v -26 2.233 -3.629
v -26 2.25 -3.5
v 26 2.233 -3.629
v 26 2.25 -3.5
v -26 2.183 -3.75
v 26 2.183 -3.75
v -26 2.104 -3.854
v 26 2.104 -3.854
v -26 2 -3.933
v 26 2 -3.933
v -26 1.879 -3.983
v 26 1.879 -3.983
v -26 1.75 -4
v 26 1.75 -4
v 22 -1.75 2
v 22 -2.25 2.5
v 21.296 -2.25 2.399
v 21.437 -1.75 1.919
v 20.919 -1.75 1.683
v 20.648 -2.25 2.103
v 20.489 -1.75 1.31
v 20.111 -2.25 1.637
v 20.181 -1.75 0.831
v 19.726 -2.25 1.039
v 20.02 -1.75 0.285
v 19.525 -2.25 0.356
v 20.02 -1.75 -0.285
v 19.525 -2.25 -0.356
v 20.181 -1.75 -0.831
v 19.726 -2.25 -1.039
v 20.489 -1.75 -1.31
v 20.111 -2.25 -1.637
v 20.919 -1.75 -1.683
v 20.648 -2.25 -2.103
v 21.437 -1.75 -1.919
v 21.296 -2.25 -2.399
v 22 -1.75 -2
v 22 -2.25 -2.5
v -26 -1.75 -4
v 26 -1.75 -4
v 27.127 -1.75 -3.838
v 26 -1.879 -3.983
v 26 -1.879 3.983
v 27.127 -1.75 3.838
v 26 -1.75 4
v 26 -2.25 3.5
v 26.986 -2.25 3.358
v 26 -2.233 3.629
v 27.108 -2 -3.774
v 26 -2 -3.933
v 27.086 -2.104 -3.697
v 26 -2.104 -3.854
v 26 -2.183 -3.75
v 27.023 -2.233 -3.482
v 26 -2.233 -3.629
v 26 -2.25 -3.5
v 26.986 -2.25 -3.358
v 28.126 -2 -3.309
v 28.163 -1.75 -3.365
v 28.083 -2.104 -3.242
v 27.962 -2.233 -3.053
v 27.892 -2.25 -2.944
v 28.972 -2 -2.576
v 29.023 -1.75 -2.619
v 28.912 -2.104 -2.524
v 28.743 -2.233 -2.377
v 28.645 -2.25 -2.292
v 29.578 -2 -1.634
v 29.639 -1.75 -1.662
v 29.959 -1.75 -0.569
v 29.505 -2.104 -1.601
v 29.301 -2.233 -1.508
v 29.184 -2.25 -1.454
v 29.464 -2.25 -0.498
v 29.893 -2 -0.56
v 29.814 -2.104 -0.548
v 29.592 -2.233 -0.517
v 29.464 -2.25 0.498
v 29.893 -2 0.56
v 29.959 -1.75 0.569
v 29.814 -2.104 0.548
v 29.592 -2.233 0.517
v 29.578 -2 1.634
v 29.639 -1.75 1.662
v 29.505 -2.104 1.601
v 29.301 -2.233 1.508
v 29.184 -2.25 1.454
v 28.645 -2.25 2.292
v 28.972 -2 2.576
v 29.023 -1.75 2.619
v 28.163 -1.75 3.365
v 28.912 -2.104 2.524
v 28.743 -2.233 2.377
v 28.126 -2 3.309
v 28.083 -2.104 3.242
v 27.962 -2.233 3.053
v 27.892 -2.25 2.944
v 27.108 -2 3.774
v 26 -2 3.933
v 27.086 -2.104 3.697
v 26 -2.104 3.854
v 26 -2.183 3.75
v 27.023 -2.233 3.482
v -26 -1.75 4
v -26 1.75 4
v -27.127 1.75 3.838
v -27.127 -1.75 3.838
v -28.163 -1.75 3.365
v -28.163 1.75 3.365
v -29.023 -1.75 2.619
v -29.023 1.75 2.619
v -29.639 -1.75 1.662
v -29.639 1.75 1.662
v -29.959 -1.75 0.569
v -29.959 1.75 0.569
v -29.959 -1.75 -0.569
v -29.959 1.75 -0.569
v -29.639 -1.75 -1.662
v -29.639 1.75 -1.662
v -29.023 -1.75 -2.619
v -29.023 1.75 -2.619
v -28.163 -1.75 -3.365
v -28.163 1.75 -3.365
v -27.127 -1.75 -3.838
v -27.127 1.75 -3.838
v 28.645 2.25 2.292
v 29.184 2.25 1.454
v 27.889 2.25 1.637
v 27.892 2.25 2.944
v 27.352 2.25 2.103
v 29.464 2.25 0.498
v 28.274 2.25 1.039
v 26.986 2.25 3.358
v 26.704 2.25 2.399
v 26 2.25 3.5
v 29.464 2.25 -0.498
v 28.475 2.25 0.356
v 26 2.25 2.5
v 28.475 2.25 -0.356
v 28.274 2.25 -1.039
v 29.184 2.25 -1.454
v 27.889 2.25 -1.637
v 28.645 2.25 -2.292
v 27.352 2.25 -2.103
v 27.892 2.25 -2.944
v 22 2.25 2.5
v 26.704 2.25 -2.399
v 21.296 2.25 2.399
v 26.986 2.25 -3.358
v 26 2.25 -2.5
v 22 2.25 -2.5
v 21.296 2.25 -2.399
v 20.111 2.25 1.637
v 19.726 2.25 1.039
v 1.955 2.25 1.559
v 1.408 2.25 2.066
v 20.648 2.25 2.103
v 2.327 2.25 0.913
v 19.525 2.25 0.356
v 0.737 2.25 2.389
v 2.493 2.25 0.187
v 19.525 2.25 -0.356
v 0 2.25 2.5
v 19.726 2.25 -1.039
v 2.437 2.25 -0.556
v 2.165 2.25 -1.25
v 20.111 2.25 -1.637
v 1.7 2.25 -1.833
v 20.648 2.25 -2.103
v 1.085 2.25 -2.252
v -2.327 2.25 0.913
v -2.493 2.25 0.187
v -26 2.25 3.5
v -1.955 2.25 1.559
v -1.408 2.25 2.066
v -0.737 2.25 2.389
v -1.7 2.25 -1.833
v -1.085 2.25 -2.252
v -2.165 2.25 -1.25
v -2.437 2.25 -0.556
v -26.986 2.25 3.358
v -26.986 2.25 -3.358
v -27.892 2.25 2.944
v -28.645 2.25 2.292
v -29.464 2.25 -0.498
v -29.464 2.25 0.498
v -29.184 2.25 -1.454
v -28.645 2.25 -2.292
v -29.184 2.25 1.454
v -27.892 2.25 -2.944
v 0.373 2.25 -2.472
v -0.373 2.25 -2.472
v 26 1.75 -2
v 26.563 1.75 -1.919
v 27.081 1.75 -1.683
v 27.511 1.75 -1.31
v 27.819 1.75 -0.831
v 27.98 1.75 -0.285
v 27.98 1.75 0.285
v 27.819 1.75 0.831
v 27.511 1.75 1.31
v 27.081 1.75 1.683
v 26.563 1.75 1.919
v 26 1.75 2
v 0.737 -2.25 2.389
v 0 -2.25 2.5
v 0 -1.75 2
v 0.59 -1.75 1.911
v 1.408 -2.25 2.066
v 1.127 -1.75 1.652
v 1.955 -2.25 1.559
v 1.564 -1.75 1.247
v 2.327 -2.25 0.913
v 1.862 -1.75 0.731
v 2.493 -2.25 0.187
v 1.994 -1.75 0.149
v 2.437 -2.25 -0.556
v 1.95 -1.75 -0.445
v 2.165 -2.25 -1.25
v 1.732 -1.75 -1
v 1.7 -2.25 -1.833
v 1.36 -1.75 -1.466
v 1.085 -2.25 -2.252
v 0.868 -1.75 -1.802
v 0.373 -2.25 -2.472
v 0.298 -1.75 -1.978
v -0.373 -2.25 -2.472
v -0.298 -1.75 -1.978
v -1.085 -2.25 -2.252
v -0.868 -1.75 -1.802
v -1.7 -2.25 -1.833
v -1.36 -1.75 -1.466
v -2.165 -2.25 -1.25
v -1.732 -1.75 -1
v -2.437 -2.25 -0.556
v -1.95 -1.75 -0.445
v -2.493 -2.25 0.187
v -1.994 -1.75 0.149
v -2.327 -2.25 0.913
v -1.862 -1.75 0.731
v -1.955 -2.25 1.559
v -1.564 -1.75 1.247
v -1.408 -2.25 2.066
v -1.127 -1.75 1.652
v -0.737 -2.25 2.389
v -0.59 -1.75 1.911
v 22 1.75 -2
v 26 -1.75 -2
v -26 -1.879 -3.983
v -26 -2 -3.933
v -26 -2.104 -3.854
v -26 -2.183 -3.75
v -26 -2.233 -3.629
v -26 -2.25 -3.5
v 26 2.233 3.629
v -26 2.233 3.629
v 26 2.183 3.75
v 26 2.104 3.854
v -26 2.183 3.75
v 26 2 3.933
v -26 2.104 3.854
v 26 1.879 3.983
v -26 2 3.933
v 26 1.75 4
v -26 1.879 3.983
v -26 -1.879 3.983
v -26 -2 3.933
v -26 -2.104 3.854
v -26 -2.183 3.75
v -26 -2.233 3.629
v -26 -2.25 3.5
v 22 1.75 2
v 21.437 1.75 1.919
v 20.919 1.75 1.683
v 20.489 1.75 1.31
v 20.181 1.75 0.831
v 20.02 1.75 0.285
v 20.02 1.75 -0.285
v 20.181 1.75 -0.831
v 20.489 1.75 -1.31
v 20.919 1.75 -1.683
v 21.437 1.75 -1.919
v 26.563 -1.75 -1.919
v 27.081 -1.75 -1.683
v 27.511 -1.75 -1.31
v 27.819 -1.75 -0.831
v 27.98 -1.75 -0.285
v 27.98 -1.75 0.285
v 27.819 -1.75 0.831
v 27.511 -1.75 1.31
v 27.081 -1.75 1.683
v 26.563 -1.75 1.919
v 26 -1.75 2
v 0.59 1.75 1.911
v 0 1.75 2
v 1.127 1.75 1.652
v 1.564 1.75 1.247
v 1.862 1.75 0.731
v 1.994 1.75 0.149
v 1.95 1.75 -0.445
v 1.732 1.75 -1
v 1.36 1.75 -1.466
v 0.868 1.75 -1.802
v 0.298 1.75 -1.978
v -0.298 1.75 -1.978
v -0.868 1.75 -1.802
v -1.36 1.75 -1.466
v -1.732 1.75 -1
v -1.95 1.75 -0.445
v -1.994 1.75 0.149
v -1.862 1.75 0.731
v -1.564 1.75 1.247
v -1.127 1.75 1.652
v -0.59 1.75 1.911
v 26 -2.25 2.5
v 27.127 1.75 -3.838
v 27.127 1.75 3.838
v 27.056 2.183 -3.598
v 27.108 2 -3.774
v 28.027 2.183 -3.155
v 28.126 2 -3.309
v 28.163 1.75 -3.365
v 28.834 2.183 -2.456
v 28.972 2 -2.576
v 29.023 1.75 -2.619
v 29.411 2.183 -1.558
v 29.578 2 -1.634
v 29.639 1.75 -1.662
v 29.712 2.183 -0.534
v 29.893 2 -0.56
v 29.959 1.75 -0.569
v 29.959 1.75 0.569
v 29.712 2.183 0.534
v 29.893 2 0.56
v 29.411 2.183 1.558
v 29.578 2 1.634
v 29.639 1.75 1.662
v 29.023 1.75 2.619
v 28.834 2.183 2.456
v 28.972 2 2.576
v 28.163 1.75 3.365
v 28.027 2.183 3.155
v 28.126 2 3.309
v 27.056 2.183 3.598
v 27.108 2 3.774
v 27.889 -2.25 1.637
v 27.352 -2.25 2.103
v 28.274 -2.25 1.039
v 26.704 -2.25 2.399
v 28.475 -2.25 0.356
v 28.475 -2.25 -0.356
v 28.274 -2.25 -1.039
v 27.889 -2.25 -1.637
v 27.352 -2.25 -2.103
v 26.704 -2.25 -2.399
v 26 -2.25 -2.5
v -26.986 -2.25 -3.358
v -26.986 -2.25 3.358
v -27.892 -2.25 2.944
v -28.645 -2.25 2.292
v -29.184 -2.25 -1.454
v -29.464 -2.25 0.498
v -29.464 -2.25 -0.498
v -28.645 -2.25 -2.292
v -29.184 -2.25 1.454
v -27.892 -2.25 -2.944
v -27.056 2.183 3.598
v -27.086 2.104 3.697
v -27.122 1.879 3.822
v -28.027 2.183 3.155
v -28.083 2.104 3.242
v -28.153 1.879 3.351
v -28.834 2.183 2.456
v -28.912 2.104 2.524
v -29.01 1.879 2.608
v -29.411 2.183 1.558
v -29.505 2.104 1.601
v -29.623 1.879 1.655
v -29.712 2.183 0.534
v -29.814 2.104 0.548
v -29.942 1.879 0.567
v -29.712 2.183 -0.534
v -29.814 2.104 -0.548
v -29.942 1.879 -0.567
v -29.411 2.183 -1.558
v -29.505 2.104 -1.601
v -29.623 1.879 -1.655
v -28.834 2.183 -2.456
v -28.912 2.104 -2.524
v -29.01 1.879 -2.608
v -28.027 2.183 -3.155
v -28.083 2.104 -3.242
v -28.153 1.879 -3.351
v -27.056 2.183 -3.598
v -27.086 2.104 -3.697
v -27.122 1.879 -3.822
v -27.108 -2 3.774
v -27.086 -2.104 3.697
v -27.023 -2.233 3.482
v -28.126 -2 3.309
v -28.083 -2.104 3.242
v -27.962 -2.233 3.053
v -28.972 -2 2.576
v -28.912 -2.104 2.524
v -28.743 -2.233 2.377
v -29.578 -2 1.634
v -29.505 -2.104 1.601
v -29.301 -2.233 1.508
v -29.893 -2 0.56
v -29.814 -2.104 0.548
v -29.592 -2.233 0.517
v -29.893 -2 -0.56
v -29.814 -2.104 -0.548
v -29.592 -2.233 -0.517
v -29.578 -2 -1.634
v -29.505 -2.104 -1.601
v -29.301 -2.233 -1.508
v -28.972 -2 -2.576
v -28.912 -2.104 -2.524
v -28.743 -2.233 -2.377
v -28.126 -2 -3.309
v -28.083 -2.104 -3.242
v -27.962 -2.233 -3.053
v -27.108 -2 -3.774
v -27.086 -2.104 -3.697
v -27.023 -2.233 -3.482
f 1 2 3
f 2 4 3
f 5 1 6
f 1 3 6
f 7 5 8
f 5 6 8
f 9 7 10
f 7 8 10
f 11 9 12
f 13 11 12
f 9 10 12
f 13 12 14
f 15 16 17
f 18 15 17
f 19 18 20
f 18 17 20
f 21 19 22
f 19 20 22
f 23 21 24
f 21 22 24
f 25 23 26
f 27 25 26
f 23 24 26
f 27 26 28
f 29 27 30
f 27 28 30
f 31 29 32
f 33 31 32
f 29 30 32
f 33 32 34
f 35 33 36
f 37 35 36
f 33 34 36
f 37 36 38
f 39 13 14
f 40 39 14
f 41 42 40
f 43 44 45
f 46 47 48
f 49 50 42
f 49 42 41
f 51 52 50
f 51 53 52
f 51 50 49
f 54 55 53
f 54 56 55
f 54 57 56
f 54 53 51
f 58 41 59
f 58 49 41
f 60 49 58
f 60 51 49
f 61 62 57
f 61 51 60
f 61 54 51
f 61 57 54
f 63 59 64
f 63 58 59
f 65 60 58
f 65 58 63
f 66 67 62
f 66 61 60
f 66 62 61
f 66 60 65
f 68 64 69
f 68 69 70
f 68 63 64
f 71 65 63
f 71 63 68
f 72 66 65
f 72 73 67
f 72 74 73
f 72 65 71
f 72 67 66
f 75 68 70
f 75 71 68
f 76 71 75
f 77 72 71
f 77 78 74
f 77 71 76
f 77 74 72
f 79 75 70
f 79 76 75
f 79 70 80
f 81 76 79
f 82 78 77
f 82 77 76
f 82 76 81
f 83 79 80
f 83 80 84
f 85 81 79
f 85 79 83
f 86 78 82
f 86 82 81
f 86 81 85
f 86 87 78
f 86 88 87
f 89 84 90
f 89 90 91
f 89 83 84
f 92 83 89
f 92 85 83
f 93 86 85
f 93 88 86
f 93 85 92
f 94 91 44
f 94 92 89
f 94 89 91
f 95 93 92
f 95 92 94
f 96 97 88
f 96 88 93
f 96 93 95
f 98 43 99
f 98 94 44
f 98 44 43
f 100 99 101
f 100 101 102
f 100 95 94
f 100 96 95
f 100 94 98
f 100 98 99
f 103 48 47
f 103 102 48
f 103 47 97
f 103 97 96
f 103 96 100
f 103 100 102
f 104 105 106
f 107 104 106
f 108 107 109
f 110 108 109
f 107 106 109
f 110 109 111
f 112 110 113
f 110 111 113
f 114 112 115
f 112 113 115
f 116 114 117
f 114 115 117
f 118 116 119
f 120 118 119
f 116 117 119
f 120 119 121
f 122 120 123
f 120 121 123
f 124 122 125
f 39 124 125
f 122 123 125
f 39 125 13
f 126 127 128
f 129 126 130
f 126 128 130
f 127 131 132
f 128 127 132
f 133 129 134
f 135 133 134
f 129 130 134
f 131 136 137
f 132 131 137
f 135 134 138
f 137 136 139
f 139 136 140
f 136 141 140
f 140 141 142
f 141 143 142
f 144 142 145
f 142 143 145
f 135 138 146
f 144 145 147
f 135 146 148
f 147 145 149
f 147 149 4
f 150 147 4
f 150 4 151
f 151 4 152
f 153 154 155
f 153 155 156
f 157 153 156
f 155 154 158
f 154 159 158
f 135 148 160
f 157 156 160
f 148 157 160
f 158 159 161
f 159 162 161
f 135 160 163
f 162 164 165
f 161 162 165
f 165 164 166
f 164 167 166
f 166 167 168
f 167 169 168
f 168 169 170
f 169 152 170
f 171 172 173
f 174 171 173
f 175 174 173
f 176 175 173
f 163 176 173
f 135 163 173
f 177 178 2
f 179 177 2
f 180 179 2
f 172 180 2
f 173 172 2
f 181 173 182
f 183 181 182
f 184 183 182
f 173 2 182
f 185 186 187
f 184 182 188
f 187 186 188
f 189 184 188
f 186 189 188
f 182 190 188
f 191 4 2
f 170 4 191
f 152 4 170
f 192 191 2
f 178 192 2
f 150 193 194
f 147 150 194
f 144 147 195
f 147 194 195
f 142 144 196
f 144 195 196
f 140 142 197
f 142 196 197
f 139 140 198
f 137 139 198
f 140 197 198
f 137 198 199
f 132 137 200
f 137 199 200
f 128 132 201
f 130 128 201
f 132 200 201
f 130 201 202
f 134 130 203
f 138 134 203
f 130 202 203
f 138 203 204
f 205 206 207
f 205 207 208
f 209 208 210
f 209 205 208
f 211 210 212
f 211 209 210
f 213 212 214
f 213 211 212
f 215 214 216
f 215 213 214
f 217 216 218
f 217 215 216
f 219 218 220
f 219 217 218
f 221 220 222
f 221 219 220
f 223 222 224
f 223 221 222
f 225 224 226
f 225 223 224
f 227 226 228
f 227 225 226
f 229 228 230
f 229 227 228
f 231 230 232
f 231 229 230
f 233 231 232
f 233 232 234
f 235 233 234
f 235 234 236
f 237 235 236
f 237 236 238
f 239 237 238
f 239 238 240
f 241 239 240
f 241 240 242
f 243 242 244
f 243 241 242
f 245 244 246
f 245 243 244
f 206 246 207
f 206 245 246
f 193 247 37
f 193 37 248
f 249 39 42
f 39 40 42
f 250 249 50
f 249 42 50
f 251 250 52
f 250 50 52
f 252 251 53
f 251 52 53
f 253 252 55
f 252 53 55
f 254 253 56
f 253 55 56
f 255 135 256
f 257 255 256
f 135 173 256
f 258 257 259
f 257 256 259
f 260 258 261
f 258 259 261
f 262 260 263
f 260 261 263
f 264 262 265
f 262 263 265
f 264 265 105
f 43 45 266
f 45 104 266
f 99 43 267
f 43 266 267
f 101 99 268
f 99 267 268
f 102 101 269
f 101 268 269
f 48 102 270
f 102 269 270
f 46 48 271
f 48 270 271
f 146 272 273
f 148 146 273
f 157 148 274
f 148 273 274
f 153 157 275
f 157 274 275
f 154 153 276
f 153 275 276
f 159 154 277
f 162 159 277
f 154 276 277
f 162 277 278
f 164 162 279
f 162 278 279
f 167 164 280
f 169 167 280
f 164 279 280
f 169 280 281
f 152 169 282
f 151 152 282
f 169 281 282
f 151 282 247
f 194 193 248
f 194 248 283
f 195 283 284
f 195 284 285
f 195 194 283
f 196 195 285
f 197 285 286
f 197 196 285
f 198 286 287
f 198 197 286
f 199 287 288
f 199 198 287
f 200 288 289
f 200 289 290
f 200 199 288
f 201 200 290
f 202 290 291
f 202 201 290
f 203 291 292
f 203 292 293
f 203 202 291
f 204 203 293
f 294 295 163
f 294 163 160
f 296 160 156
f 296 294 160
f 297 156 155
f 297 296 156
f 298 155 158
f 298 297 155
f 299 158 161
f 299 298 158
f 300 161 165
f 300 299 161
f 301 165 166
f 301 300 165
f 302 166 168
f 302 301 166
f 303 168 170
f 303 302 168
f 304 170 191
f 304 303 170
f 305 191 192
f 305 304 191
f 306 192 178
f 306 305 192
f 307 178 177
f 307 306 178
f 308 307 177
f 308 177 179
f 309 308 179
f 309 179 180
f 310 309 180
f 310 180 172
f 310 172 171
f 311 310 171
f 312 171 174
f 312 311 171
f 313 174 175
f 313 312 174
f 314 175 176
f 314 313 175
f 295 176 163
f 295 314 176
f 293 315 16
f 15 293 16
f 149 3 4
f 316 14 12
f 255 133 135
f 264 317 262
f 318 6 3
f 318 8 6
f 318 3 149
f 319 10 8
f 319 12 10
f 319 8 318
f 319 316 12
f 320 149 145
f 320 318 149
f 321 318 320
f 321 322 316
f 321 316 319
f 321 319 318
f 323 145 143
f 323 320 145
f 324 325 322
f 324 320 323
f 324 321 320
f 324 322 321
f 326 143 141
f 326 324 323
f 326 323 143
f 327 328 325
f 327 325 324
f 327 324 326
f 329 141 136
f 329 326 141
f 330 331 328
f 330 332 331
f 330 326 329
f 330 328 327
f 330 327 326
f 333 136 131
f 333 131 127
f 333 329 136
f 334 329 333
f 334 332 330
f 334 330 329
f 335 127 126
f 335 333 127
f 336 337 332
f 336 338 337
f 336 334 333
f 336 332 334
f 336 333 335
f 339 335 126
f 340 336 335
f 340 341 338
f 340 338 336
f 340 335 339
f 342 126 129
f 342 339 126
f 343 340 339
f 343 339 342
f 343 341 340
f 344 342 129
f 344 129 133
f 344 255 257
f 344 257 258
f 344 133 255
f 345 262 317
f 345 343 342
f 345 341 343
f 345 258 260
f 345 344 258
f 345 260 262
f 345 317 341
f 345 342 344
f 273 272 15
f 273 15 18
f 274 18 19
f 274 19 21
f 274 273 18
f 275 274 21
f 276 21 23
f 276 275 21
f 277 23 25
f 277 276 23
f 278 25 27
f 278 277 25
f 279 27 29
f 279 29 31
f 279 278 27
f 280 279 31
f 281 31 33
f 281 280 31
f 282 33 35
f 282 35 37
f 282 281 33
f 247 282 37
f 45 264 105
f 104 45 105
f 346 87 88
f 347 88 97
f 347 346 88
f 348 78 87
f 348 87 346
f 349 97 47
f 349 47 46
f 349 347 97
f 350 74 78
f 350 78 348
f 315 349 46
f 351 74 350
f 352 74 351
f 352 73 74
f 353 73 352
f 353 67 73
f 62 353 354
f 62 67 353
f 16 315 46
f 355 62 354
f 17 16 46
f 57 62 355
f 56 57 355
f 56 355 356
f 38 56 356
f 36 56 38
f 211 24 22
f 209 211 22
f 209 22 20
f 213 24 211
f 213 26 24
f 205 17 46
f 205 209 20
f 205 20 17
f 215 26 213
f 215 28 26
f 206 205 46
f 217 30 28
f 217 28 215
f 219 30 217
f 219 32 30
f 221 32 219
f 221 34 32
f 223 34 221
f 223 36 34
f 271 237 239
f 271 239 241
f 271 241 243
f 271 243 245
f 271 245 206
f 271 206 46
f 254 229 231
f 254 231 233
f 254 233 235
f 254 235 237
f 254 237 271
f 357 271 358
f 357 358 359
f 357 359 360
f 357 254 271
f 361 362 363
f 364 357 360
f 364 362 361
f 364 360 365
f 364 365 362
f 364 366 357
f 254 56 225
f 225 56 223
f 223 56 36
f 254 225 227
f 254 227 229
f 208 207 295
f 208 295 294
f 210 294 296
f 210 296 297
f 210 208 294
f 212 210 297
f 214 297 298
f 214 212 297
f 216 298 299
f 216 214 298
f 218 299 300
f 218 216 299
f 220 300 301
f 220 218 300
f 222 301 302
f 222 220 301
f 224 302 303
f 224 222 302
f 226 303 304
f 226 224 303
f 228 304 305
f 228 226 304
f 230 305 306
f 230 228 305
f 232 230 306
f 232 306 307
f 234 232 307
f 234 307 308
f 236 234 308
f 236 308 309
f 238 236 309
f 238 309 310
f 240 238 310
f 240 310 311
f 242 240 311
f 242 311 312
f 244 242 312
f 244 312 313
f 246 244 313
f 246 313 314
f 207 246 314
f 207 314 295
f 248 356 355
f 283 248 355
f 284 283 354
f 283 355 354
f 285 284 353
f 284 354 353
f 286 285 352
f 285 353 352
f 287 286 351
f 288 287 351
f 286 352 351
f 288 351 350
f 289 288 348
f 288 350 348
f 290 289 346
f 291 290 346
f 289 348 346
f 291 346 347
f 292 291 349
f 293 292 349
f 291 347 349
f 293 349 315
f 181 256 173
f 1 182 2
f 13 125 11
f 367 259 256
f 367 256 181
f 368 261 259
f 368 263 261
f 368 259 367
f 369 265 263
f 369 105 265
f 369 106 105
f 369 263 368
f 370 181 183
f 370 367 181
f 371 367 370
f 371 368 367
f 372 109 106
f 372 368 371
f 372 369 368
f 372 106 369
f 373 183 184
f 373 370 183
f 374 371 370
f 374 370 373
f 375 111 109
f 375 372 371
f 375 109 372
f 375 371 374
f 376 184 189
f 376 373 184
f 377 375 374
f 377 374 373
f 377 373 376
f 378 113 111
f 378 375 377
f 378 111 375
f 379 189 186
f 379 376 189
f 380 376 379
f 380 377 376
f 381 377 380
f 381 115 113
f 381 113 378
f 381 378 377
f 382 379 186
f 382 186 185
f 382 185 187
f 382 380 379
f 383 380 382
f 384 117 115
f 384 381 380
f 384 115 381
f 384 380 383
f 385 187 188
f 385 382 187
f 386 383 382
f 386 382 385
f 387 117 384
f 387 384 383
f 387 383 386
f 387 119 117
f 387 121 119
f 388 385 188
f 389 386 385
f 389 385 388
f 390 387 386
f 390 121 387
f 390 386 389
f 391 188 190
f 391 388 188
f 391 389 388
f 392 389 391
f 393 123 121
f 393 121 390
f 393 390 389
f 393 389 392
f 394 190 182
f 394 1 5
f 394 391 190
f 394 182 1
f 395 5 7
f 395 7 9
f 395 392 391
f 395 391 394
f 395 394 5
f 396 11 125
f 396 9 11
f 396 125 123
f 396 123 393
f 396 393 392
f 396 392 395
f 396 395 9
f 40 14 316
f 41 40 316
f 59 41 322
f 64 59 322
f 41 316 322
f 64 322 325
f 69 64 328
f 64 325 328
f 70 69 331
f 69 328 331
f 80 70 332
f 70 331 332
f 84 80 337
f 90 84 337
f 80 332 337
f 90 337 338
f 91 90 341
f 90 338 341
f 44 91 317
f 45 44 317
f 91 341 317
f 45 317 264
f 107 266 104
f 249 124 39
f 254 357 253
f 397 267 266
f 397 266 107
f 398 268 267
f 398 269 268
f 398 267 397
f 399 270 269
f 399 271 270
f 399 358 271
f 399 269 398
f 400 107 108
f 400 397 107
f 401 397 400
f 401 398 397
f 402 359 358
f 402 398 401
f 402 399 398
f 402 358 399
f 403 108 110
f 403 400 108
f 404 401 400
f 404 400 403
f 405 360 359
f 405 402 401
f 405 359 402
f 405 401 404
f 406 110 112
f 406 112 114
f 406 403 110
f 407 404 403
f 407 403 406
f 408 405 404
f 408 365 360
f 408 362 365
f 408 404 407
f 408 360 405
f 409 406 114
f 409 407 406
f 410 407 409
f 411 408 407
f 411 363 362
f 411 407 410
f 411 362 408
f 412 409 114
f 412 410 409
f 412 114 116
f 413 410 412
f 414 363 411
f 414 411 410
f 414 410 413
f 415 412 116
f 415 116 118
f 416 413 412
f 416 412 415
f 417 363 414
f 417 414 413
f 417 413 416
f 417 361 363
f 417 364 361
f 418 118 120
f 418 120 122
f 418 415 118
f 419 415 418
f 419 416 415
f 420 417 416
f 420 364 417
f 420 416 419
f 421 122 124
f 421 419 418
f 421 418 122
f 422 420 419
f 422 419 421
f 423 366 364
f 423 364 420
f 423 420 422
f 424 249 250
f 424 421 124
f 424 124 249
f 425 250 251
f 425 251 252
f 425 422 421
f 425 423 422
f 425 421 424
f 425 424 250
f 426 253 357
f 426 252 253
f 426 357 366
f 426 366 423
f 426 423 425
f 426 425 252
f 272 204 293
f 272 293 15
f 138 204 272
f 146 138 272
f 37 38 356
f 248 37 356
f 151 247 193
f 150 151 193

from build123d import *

# Parameters (mm, degrees)
ESBO_O1_R                = 2
RESSALTO_EXTRUS_O1_DEPTH = 2.25
CHANFRO1_SIZE            = 0.5
FILETE1_R                = 0.5


with BuildPart() as part:
    # Esboço1 → Ressalto-extrusão1 (new, symmetric)
    with BuildSketch(Plane(origin=(0, 0, 0), x_dir=(1, 0, 0), z_dir=(0, 1, 0))):
        with BuildLine():
            Line((-26, 4), (26, 4))
            ThreePointArc((26, 4), (30, 0), (26, -4))
            Line((26, -4), (-26, -4))
            ThreePointArc((-26, -4), (-30, 0), (-26, 4))
        make_face()
        with Locations(Location((0, 0, 0), (0, 0, 270))):
            Circle(ESBO_O1_R, mode=Mode.SUBTRACT)
        with BuildLine():
            Line((26, -2), (22, -2))
            ThreePointArc((22, -2), (20, 0), (22, 2))
            Line((22, 2), (26, 2))
            ThreePointArc((26, 2), (28, 0), (26, -2))
        make_face(mode=Mode.SUBTRACT)
    extrude(amount=RESSALTO_EXTRUS_O1_DEPTH, both=True)

    # Chanfro1
    chanfro1_edges = [part.edges().sort_by_distance(p)[0] for p in [
        (0, -2.25, -2),
        (0, 2.25, -2),
        (28, -2.25, 0),
        (24, -2.25, -2),
        (20, -2.25, 0),
        (24, -2.25, 2),
        (28, 2.25, 0),
        (24, 2.25, -2),
        (20, 2.25, 0),
        (24, 2.25, 2),
    ]]
    chamfer(chanfro1_edges, length=CHANFRO1_SIZE)

    # Filete1
    filete1_edges = [part.edges().sort_by_distance(p)[0] for p in [
        (30, 2.25, 0),
        (0, 2.25, -4),
        (-30, 2.25, 0),
        (0, -2.25, -4),
        (30, -2.25, 0),
        (0, -2.25, 4),
        (-30, -2.25, 0),
        (0, 2.25, 4),
    ]]
    fillet(filete1_edges, radius=FILETE1_R)


solid = part.part
